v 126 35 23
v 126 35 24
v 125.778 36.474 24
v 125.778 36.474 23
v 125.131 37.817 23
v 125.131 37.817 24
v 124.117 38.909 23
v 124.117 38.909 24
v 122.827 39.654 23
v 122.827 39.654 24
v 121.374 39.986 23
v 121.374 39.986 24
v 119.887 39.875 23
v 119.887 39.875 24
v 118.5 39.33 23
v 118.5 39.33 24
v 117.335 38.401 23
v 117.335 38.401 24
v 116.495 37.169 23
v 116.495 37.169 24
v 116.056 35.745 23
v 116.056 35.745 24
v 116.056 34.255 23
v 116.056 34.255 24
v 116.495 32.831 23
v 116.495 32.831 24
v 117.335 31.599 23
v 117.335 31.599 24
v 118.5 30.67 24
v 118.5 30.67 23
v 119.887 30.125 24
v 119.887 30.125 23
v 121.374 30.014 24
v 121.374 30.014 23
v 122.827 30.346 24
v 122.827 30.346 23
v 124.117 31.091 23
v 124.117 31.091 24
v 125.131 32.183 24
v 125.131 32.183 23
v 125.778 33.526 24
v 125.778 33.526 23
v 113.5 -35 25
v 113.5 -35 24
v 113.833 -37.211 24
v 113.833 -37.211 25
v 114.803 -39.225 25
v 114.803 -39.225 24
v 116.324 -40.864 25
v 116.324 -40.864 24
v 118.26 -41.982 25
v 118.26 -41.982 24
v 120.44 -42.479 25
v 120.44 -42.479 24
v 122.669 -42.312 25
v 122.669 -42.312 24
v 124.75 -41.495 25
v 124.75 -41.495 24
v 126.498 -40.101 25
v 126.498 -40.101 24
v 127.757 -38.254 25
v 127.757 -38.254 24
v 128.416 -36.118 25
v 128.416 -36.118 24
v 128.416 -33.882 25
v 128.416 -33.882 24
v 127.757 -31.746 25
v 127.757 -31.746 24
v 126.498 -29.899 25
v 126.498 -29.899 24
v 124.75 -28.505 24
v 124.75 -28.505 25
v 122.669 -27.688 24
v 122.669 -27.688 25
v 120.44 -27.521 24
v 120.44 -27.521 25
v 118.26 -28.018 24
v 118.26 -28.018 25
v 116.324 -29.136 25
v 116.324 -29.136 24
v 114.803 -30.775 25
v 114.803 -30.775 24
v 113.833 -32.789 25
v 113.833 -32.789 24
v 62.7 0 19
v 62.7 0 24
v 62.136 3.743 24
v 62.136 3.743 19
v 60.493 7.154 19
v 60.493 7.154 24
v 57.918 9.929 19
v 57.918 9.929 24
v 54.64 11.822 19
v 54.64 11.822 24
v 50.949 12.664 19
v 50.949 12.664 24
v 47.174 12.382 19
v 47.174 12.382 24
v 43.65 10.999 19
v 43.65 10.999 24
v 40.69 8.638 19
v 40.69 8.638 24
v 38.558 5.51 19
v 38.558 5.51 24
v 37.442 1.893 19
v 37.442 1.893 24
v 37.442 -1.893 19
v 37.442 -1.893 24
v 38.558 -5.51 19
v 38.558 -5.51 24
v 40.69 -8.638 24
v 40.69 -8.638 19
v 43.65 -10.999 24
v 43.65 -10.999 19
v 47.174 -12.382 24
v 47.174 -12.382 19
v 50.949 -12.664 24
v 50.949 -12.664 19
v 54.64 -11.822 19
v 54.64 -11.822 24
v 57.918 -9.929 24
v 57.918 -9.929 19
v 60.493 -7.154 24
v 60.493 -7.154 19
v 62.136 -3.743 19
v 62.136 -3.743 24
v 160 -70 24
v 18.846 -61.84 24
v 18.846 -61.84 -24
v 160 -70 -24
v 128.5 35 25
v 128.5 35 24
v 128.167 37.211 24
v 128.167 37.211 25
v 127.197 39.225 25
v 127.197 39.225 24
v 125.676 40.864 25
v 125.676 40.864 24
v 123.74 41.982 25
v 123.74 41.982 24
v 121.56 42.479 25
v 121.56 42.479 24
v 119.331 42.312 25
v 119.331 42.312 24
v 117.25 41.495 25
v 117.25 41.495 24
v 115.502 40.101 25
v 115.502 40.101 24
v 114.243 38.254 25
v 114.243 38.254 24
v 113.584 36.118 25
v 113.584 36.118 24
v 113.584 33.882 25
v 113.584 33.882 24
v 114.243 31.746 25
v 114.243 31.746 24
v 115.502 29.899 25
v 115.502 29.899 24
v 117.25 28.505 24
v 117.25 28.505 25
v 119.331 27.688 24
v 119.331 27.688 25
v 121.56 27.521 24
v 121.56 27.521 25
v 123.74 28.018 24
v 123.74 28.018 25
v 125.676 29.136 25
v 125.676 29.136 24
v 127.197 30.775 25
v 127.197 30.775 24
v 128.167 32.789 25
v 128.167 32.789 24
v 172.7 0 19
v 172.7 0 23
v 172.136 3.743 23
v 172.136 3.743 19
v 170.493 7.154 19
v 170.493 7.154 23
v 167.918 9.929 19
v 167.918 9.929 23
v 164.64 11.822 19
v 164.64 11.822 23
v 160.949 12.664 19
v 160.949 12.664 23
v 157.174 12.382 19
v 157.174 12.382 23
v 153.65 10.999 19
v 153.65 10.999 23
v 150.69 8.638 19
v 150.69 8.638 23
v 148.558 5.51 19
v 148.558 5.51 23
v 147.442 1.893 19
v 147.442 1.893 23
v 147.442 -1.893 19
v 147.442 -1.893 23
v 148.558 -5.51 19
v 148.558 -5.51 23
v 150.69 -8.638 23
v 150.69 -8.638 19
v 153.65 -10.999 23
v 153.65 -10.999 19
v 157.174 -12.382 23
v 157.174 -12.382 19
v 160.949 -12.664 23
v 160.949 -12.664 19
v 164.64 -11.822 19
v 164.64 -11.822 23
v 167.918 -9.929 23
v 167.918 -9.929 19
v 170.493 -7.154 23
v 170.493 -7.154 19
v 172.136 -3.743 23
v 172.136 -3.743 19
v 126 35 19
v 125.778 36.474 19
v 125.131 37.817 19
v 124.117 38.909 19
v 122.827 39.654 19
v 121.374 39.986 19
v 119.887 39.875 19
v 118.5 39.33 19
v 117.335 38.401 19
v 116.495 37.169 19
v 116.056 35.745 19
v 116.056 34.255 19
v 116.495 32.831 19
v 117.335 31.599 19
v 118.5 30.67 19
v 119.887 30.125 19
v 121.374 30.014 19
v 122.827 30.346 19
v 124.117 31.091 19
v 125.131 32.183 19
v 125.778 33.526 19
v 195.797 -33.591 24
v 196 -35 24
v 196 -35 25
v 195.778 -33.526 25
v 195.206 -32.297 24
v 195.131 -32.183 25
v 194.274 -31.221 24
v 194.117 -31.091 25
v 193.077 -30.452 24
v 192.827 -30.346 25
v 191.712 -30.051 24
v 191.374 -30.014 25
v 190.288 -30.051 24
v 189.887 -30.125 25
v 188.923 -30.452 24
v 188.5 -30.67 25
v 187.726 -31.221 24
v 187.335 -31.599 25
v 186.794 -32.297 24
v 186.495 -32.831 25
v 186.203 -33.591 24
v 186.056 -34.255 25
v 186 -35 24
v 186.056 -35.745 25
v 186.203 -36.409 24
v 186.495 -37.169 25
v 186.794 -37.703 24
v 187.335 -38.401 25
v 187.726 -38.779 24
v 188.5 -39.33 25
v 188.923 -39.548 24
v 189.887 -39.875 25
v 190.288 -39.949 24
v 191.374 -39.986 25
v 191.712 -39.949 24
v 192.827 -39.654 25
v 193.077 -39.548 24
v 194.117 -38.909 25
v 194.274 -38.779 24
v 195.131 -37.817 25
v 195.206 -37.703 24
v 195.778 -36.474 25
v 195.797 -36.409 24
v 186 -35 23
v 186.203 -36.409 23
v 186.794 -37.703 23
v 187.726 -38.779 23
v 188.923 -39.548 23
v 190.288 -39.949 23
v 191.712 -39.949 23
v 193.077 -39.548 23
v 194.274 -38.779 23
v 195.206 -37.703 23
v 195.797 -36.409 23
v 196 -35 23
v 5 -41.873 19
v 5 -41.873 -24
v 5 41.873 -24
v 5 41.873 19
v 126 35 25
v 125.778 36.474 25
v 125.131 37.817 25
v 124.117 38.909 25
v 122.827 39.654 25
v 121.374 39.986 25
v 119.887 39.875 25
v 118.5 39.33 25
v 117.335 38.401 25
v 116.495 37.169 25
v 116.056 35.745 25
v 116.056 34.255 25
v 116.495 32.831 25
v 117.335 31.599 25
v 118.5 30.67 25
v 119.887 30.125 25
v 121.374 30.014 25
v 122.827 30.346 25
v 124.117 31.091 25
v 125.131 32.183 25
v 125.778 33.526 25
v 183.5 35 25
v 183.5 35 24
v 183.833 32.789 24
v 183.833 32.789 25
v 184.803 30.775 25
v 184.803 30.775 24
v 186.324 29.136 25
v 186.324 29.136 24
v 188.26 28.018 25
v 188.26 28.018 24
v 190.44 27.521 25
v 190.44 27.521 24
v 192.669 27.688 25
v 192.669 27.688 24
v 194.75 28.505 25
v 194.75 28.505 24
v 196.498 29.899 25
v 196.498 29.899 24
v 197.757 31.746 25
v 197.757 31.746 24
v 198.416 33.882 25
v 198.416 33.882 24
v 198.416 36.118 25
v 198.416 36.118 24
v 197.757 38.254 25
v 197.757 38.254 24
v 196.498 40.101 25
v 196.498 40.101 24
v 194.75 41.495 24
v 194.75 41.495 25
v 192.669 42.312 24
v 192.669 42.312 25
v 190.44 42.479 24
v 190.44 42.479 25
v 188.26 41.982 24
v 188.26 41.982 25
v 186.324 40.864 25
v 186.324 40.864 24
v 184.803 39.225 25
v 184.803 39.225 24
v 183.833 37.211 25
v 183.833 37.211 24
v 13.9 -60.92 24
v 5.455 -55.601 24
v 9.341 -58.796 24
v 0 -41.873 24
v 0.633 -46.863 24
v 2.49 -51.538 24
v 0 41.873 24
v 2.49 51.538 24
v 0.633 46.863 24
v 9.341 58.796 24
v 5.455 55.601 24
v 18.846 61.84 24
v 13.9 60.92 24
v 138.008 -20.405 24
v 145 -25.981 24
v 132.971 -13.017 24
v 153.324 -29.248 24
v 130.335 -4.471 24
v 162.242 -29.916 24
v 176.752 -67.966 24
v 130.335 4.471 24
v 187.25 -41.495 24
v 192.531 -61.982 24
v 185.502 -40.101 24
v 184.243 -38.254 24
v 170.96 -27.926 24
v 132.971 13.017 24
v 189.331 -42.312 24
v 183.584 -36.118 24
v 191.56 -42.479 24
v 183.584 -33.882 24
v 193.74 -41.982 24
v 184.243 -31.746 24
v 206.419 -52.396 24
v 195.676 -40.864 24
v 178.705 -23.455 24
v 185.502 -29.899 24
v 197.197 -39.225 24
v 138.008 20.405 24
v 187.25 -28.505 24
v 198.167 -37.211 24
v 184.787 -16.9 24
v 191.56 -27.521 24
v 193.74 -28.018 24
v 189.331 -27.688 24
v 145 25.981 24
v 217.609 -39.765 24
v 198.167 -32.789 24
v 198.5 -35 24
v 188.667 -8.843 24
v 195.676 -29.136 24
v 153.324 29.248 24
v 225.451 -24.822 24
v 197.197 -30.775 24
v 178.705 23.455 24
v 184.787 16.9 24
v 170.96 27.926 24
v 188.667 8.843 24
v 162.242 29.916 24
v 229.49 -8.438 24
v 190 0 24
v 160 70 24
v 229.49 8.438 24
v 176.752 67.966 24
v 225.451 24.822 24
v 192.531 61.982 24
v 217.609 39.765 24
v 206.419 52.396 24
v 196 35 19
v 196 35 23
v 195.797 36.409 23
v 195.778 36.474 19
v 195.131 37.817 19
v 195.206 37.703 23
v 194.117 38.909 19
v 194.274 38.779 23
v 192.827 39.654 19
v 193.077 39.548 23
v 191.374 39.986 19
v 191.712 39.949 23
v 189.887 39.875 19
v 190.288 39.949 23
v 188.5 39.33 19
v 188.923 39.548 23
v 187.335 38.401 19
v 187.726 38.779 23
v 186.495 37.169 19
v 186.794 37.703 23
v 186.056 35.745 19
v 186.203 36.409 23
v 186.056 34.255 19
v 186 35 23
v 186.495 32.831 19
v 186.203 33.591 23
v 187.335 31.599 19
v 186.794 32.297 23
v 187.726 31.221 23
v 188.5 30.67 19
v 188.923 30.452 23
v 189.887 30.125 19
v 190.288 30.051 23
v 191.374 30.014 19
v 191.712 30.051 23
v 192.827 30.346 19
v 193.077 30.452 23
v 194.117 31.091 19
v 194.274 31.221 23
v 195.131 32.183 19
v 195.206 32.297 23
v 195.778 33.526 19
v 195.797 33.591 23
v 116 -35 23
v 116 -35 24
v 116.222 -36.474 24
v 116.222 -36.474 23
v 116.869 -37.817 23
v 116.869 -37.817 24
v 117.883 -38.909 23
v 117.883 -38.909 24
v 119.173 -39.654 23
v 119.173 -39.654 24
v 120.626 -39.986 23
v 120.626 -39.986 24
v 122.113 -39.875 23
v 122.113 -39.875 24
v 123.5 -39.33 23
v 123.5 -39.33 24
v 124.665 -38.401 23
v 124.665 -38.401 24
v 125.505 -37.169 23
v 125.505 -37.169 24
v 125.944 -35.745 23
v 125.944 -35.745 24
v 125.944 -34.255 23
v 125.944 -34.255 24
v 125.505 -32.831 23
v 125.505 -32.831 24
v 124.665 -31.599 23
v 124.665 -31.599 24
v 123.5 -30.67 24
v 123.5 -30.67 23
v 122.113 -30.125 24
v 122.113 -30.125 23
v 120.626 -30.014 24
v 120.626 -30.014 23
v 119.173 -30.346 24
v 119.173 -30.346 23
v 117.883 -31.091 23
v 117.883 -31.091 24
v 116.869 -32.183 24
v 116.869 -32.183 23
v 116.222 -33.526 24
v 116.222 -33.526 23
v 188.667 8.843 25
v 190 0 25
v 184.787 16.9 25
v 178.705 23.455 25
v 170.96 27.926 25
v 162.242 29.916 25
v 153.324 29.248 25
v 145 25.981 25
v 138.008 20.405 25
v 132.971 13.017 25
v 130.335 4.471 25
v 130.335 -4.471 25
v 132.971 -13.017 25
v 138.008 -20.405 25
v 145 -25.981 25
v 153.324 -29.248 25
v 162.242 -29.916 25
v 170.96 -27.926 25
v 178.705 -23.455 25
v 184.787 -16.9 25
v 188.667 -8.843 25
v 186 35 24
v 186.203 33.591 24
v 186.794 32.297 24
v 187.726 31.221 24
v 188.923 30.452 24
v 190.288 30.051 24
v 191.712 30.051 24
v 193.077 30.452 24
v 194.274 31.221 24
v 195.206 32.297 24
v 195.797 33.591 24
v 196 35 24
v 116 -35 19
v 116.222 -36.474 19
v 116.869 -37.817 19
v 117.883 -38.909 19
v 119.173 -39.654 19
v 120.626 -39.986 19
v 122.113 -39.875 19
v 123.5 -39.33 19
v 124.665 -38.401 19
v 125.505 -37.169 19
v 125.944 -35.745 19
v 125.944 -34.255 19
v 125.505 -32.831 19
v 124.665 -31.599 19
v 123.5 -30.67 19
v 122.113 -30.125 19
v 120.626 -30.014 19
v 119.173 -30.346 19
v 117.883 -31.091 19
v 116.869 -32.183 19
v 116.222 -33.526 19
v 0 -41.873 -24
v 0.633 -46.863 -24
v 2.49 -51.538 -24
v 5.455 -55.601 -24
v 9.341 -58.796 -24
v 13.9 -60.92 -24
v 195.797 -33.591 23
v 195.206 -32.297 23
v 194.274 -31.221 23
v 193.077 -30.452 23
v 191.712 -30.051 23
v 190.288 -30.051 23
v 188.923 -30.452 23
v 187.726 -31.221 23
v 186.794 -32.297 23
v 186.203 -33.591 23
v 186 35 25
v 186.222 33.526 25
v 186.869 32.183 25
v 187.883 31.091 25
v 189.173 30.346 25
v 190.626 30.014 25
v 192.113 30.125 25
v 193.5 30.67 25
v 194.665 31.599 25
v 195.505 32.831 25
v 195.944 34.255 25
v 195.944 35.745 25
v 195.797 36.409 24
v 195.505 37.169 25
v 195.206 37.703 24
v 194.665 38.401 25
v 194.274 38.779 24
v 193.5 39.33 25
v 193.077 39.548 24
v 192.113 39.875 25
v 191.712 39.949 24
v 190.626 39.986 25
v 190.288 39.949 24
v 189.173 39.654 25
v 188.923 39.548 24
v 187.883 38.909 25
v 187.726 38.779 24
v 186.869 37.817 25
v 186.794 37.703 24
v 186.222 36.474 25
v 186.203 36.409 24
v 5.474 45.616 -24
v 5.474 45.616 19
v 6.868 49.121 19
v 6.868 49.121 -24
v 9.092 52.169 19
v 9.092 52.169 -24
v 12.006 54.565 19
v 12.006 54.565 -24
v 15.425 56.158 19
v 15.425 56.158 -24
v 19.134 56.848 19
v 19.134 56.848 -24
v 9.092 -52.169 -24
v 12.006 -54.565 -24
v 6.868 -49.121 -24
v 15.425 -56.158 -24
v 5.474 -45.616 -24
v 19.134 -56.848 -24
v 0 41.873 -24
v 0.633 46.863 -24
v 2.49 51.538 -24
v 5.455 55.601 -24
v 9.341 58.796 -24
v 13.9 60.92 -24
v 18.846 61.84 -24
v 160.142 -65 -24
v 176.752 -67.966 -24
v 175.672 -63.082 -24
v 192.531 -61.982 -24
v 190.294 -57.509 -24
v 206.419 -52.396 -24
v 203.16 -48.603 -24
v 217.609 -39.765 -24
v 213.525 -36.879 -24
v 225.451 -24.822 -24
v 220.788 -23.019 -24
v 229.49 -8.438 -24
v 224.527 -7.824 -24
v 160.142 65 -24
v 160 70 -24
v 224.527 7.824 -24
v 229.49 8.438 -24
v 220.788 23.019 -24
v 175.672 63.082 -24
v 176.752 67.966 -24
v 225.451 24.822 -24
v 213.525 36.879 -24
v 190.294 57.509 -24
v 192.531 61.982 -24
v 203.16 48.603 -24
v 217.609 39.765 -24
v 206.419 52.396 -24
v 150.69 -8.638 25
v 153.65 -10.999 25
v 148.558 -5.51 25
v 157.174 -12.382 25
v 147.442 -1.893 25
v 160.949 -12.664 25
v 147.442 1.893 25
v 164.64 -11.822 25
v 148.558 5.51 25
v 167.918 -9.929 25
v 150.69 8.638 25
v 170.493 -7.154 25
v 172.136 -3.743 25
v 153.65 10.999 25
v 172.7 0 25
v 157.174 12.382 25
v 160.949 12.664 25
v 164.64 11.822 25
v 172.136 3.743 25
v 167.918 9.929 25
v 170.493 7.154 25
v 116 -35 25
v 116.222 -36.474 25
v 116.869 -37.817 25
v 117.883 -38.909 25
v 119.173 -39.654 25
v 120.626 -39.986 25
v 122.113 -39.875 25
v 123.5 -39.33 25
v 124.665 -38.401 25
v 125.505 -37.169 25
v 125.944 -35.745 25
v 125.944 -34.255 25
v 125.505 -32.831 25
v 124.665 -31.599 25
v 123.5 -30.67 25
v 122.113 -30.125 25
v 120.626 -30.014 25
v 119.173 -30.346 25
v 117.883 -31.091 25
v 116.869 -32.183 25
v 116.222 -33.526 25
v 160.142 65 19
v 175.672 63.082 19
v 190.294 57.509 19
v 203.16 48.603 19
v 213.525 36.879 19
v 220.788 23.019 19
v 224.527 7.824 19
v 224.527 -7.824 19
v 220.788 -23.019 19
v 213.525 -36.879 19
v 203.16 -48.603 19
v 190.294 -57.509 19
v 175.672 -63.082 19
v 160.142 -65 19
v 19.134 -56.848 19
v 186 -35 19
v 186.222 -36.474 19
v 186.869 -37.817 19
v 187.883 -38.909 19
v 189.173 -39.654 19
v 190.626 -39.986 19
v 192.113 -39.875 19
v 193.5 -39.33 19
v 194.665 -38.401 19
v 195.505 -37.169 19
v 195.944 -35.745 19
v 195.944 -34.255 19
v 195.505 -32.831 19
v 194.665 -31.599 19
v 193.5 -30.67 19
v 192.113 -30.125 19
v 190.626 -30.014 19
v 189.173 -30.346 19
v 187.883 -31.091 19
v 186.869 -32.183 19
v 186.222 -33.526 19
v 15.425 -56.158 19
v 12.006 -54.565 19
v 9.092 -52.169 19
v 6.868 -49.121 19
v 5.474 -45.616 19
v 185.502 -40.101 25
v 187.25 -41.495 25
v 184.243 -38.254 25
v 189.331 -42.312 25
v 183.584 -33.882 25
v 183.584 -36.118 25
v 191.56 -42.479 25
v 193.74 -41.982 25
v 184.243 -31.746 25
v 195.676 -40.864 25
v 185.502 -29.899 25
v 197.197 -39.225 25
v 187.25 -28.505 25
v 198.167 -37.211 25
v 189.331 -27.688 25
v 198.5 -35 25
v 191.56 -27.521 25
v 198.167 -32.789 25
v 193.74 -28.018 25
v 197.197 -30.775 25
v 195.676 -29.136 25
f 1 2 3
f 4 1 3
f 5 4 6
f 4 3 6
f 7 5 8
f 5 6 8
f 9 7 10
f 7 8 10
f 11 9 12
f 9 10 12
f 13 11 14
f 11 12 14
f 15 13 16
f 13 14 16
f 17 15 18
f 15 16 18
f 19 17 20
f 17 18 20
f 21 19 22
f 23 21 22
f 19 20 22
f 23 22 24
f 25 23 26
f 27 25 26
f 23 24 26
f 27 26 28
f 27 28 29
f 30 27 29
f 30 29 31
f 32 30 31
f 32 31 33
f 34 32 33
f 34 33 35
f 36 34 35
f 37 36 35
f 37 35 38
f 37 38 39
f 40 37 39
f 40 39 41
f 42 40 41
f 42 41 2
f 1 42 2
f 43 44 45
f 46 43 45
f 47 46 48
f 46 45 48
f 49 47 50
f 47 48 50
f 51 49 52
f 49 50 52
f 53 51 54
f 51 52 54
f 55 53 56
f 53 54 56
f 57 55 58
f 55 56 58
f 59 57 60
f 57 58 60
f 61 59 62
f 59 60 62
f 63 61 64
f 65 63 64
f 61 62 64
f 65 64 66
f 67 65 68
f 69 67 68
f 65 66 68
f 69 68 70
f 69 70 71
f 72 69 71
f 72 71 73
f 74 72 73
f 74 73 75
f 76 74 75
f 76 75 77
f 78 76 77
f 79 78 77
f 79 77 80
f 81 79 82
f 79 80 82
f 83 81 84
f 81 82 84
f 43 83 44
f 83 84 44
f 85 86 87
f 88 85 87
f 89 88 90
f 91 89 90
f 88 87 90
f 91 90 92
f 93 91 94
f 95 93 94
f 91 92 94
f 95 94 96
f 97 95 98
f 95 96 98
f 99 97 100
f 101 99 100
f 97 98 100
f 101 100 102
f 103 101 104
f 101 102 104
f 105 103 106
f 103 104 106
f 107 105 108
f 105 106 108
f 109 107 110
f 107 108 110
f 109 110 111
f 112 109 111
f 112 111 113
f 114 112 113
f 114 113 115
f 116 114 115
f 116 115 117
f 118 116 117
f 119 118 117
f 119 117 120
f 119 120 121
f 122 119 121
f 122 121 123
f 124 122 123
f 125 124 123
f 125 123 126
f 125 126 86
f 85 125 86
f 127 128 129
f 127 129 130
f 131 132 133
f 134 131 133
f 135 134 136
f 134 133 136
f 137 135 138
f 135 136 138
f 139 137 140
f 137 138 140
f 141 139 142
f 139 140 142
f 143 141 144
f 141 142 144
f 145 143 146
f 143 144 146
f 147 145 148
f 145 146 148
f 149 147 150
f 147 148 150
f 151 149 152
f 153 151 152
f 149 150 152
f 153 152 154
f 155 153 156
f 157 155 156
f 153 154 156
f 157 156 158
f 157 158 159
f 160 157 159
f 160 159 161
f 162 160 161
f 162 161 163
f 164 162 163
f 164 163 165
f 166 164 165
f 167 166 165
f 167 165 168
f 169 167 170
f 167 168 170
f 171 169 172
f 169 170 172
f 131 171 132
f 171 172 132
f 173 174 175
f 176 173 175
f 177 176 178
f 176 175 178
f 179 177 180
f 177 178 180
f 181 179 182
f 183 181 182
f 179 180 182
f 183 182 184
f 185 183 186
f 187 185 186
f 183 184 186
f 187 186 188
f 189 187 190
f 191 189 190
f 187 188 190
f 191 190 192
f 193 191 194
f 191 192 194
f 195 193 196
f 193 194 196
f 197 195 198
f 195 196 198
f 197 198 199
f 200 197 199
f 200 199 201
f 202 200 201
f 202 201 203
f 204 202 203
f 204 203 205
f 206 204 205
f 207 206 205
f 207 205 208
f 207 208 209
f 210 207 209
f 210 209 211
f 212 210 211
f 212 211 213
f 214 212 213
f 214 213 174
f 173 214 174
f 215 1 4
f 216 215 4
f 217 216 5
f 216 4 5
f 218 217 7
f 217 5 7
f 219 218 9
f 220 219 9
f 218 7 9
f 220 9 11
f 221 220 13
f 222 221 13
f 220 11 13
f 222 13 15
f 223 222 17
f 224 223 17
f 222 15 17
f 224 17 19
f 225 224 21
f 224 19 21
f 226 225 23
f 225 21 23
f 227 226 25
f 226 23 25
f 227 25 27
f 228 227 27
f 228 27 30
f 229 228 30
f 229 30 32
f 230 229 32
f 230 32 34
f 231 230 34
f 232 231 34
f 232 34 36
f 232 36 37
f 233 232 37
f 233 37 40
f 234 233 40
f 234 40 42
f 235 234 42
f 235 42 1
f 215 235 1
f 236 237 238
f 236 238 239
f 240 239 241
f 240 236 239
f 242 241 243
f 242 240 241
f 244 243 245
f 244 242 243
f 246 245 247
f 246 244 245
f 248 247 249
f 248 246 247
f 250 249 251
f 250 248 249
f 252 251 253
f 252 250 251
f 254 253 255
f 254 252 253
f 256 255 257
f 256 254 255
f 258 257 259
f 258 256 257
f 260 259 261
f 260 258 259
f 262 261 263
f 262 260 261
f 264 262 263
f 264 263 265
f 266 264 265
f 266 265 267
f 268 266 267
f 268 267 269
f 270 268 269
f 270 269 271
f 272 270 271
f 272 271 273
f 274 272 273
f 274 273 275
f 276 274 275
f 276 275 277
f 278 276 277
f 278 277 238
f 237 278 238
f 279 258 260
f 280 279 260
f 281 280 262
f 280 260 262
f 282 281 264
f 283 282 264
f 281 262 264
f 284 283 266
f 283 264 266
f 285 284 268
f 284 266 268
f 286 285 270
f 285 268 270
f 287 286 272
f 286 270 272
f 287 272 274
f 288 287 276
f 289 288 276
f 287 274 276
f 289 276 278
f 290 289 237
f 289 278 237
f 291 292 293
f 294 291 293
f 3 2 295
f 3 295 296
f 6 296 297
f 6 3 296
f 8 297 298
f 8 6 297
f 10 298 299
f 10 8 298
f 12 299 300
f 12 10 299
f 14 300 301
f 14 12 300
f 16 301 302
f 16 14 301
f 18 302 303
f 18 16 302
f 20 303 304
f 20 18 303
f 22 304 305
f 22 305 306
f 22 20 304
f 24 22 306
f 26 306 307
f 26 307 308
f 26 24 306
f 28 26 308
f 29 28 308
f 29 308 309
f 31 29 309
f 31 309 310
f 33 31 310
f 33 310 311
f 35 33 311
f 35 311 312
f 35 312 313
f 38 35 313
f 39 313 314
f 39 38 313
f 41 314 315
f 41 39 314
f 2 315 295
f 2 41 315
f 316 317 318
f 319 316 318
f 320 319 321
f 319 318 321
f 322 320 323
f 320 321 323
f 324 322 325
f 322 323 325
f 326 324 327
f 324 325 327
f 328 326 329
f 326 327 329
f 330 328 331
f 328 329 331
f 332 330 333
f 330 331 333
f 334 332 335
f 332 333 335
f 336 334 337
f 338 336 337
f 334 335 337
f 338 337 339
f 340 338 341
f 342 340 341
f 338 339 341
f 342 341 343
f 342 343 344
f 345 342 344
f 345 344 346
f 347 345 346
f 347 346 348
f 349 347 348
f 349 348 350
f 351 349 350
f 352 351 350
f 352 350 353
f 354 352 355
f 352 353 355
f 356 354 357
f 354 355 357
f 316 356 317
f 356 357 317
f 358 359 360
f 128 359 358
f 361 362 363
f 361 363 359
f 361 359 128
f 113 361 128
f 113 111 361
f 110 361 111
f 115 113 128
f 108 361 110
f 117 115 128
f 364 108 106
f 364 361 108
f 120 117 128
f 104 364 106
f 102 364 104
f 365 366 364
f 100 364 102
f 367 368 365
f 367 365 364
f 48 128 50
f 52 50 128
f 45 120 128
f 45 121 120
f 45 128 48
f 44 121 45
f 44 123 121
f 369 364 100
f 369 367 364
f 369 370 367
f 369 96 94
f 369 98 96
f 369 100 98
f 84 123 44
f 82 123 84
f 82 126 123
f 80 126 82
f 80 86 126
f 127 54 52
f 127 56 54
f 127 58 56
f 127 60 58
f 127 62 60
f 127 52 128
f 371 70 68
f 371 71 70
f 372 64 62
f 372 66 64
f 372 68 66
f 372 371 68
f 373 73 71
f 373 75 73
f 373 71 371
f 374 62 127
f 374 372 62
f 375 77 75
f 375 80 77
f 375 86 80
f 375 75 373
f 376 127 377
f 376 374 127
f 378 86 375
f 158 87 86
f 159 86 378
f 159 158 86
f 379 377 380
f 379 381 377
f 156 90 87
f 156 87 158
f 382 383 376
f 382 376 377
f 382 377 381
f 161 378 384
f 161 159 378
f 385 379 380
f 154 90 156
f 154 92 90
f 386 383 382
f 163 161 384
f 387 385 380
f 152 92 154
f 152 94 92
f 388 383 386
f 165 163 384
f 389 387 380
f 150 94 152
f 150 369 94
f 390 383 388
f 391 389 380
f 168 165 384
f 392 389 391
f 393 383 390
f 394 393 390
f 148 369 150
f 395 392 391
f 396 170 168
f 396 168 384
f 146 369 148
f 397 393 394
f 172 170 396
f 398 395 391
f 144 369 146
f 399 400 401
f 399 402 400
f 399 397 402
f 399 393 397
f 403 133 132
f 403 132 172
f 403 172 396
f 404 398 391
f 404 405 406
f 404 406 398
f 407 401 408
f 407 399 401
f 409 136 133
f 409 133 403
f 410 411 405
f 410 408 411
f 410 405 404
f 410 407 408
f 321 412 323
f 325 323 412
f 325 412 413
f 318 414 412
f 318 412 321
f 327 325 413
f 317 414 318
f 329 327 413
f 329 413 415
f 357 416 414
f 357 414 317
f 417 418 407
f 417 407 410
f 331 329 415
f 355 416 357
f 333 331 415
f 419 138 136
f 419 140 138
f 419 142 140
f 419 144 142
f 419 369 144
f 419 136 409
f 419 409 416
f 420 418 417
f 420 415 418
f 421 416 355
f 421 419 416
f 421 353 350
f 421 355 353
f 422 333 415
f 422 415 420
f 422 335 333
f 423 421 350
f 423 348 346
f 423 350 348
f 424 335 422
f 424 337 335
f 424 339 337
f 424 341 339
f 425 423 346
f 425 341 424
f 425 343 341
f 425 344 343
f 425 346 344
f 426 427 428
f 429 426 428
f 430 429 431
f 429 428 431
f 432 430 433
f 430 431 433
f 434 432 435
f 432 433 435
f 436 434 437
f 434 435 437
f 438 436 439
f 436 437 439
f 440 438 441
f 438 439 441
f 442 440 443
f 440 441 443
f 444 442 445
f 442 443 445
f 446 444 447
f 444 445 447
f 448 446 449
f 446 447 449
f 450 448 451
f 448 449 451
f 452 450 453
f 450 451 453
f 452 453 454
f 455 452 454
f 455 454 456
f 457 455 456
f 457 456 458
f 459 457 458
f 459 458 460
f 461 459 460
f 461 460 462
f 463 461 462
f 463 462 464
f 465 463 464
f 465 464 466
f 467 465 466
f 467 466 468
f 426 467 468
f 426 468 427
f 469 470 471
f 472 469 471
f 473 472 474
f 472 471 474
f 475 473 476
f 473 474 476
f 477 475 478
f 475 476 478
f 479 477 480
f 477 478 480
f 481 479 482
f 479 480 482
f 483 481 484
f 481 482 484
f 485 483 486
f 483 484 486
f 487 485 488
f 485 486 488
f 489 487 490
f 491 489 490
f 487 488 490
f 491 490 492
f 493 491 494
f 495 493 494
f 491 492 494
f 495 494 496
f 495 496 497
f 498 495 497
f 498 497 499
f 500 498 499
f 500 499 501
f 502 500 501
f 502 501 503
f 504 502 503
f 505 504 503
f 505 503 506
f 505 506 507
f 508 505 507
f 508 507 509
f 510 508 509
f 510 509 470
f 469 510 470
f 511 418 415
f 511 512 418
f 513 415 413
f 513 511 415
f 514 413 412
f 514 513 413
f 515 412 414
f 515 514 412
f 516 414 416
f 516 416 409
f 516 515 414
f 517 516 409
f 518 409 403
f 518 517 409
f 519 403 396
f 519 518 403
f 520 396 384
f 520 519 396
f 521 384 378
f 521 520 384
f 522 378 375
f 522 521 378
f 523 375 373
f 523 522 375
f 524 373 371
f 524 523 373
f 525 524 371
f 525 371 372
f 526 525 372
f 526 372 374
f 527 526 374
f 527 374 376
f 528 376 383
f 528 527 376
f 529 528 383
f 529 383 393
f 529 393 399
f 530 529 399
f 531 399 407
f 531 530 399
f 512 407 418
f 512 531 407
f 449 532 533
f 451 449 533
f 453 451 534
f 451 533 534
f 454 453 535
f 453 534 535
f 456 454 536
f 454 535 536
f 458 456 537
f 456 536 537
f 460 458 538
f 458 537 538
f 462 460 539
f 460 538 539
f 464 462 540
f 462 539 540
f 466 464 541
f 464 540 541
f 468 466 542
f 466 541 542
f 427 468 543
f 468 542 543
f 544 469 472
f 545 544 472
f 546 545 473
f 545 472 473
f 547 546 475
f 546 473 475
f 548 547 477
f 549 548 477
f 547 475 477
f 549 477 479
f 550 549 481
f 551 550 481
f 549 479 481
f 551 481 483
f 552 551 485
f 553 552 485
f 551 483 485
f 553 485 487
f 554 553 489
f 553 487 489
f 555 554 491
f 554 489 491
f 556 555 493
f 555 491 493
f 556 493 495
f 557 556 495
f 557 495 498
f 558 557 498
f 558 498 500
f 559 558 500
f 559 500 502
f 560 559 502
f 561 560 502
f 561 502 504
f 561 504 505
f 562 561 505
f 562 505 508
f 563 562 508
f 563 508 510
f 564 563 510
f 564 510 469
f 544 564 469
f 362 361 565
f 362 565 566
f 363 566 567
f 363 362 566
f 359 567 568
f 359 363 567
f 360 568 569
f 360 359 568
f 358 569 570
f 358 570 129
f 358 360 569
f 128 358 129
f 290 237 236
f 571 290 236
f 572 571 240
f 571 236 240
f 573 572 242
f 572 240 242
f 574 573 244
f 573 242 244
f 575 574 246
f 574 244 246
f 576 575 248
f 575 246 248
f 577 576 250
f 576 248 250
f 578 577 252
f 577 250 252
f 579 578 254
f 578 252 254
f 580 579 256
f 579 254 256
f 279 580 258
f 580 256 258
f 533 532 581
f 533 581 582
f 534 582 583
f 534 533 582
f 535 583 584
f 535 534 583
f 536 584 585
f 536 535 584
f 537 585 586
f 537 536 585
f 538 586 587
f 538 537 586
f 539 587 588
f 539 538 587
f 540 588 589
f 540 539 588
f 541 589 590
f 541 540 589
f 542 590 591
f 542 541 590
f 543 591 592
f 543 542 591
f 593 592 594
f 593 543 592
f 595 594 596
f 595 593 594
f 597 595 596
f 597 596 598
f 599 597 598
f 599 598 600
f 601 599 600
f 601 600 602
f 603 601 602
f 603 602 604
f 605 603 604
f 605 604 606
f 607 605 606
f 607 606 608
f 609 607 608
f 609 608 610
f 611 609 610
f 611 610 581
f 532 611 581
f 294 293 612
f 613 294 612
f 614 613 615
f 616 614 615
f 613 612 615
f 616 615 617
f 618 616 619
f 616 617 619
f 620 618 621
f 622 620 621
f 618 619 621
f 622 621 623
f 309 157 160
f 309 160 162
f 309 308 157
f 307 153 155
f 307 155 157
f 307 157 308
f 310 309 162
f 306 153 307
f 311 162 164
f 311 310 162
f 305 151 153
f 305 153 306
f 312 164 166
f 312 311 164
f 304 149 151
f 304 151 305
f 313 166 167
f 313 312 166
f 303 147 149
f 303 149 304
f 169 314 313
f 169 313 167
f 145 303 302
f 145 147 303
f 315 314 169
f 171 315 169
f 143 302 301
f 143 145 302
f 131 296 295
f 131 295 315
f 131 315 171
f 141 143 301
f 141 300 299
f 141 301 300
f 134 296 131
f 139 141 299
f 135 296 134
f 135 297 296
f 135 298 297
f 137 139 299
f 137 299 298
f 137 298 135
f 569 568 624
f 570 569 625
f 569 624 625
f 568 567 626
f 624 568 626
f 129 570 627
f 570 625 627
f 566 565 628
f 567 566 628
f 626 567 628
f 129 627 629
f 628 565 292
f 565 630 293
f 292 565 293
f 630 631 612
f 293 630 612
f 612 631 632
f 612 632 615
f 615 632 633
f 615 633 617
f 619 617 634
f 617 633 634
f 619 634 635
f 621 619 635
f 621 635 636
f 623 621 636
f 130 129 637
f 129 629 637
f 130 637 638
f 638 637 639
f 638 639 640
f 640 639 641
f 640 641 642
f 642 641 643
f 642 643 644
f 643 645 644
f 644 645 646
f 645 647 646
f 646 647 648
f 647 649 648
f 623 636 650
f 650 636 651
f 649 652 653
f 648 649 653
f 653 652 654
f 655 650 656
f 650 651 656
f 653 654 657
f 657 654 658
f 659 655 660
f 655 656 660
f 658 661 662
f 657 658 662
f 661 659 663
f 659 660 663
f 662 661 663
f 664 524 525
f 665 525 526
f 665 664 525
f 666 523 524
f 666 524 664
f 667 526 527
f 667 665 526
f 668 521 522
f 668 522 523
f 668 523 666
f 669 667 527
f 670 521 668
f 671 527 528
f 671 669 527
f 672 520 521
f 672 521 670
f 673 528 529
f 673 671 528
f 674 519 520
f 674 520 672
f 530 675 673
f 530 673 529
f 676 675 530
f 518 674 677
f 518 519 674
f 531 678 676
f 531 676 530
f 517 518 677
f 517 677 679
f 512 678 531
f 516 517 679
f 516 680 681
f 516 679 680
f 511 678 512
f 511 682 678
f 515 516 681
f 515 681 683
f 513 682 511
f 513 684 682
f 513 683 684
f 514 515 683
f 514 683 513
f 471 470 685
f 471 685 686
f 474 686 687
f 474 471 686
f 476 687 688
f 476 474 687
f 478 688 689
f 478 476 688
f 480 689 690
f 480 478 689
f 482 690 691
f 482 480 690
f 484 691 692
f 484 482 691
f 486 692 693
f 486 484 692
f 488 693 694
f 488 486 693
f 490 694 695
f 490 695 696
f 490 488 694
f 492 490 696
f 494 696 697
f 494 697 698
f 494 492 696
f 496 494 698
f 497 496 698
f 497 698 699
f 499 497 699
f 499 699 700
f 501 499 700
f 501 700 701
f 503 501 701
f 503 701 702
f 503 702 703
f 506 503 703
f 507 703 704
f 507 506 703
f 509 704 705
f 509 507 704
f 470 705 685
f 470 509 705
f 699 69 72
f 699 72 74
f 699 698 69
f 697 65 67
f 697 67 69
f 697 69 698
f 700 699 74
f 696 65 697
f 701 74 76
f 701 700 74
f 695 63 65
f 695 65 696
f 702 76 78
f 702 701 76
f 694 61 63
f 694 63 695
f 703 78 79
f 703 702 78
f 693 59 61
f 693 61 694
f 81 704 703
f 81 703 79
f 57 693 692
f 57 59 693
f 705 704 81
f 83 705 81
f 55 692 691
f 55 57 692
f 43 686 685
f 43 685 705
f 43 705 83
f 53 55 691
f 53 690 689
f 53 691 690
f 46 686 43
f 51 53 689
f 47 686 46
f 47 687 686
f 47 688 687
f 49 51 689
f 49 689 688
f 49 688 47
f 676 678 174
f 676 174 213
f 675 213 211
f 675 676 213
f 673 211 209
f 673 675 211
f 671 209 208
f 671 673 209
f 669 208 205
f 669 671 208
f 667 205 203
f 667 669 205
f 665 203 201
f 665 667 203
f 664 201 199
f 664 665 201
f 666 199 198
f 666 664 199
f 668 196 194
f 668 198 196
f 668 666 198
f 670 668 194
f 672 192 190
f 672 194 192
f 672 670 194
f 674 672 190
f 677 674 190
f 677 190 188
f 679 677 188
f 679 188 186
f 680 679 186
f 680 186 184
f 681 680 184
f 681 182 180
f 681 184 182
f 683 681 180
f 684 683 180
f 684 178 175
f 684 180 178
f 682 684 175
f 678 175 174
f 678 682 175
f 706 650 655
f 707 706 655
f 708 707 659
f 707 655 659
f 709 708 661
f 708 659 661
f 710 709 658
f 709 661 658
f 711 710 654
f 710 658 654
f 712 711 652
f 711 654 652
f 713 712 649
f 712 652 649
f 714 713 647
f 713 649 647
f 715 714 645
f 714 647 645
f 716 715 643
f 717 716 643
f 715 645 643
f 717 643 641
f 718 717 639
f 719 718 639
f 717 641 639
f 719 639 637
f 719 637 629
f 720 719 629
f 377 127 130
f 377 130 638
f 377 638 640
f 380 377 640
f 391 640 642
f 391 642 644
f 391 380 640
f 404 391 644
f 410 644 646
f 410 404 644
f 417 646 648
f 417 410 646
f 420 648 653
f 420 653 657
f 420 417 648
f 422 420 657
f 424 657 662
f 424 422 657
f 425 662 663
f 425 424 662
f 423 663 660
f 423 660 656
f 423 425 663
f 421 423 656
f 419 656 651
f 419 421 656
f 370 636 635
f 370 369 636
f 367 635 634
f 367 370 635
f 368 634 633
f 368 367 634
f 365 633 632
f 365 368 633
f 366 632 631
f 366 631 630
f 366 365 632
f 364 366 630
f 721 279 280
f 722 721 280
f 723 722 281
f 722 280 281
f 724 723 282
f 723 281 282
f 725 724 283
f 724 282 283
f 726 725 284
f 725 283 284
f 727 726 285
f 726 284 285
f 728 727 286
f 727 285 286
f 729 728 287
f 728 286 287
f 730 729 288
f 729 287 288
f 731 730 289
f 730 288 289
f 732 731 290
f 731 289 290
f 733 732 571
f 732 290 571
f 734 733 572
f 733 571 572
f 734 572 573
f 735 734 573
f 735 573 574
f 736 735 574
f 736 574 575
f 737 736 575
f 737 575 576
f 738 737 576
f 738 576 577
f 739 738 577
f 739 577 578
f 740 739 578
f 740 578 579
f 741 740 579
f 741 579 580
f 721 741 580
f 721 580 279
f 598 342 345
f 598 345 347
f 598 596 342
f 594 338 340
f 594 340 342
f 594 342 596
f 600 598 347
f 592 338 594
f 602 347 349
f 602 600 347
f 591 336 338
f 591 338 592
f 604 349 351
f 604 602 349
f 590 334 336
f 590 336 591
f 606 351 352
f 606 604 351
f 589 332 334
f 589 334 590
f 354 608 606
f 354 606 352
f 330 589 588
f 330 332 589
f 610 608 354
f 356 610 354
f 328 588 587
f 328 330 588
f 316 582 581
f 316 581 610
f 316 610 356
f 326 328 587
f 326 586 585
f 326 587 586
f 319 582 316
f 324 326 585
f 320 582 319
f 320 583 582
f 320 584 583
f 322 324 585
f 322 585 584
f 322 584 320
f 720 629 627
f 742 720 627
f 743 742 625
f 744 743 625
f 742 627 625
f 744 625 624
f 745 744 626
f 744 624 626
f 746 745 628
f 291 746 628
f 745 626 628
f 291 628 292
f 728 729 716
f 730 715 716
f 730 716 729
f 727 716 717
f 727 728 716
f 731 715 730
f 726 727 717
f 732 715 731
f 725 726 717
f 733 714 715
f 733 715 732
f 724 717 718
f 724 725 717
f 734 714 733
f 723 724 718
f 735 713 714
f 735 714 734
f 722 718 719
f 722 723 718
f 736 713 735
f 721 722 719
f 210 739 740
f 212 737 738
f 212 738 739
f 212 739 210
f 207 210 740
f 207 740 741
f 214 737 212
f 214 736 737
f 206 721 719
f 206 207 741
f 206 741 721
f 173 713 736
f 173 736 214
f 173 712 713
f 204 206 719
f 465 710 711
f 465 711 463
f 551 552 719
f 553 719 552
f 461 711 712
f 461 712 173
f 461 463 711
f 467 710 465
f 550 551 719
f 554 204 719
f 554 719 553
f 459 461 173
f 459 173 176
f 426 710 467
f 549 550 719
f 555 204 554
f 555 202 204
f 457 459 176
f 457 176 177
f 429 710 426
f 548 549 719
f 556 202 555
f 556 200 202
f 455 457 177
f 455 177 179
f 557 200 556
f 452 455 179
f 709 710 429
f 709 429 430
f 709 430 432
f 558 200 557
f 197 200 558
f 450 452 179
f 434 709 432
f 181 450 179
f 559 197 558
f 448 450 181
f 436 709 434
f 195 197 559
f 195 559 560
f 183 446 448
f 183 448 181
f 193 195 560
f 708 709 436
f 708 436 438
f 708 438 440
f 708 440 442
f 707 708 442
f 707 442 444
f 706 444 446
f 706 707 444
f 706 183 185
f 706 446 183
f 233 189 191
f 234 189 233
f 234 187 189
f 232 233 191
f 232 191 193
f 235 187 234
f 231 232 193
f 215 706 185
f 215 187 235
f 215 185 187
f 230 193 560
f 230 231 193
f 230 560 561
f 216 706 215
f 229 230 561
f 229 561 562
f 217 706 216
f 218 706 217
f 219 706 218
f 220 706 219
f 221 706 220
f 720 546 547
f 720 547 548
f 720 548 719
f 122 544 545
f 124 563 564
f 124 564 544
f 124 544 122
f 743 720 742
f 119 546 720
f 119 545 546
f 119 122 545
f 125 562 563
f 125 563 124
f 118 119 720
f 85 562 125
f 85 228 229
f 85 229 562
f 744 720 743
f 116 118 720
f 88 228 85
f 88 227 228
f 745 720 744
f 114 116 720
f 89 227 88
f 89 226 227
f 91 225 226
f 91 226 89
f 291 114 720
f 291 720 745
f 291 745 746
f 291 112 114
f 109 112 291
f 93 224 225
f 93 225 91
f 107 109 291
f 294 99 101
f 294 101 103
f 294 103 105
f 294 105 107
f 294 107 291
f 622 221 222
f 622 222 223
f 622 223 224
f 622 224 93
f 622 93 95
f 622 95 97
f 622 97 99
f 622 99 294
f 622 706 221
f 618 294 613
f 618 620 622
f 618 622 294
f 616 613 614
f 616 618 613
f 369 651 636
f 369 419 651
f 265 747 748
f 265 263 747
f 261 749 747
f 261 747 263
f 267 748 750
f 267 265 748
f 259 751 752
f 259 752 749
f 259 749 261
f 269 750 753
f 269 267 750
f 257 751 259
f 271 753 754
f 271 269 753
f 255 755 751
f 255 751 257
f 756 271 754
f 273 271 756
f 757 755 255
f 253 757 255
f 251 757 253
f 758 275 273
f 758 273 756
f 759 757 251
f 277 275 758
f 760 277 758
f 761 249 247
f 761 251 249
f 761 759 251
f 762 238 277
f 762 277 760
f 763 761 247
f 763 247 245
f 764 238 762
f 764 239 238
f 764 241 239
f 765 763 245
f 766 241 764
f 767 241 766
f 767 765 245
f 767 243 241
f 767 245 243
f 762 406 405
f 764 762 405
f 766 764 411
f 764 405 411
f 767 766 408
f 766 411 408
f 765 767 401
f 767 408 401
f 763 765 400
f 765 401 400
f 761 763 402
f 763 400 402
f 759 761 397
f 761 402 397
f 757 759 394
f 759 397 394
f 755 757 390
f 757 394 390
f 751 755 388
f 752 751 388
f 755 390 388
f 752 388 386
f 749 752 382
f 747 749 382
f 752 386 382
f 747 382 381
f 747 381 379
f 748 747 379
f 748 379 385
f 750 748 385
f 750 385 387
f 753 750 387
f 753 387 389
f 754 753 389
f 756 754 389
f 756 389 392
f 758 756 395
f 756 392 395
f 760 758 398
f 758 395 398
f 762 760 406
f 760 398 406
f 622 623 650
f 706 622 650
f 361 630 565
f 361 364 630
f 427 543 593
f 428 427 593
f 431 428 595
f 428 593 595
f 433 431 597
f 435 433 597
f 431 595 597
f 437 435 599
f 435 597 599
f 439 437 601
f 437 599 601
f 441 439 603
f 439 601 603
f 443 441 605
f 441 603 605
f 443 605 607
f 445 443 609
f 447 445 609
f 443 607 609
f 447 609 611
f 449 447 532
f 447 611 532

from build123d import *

# Parameters (mm, degrees)
BOSS_EXTRUDE1_DEPTH = 24
CUT_EXTRUDE1_DEPTH  = 43
SKETCH4_R           = 12.7
CUT_EXTRUDE2_DEPTH  = 43
SKETCH5_R           = 5
CUT_EXTRUDE3_DEPTH  = 43
SKETCH6_R           = 7.5
SKETCH6_R_2         = 5
SKETCH6_R_3         = 30
SKETCH6_R_4         = 11
BOSS_EXTRUDE2_DEPTH = 1
SKETCH7_R           = 12.7
CUT_EXTRUDE4_DEPTH  = 10
CUT_EXTRUDE5_START  = -10
SKETCH8_R           = 12.7
CUT_EXTRUDE5_DEPTH  = 10


with BuildPart() as part:
    # Sketch1 → Boss-Extrude1 (new, symmetric)
    with BuildSketch(Plane.XY):
        with BuildLine():
            Line((0, 41.872855029), (0, -41.872855029))
            ThreePointArc((0, -41.872855029), (5.455474373, -55.600810969), (18.845677428, -61.839515726))
            Line((18.845677428, -61.839515726), (160, -70))
            ThreePointArc((160, -70), (230, 0), (160, 70))
            Line((160, 70), (18.845677428, 61.839515726))
            ThreePointArc((18.845677428, 61.839515726), (5.455474373, 55.600810969), (0, 41.872855029))
        make_face()
    extrude(amount=BOSS_EXTRUDE1_DEPTH, both=True)

    # Sketch2 → Cut-Extrude1 (cut)
    with BuildSketch(Plane(origin=(0, 0, -24), x_dir=(-1, 0, 0), z_dir=(0, 0, -1))):
        with BuildLine():
            Line((-19.134258071, 56.847850552), (-160.141737643, 64.999845465))
            ThreePointArc((-160.141737643, 64.999845465), (-225, 0), (-160.141737643, -64.999845465))
            Line((-160.141737643, -64.999845465), (-19.134258071, -56.847850552))
            ThreePointArc((-19.134258071, -56.847850552), (-9.09160578, -52.168821984), (-5, -41.872855029))
            Line((-5, -41.872855029), (-5, 41.872855029))
            ThreePointArc((-5, 41.872855029), (-9.09160578, 52.168821984), (-19.134258071, 56.847850552))
        make_face()
    extrude(amount=-CUT_EXTRUDE1_DEPTH, mode=Mode.SUBTRACT)

    # Sketch4 → Cut-Extrude2 (cut)
    with BuildSketch(Plane.XY.offset(24)):
        with Locations((160, 0)):
            Circle(SKETCH4_R)
    extrude(amount=-CUT_EXTRUDE2_DEPTH, mode=Mode.SUBTRACT)

    # Sketch5 → Cut-Extrude3 (cut)
    with BuildSketch(Plane.XY.offset(24)):
        with Locations((121, 35)):
            Circle(SKETCH5_R)
        with Locations((191, 35)):
            Circle(SKETCH5_R)
        with Locations(Location((191, -35, 0), (0, 0, 180))):
            Circle(SKETCH5_R)
        with Locations(Location((121, -35, 0), (0, 0, 180))):
            Circle(SKETCH5_R)
    extrude(amount=-CUT_EXTRUDE3_DEPTH, mode=Mode.SUBTRACT)

    # Sketch6 → Boss-Extrude2 (add, symmetric)
    # profile 1 of 5: a face of its own
    with BuildSketch(Plane.XY.offset(24)):
        with Locations((121, 35)):
            Circle(SKETCH6_R)
        with Locations((121, 35)):
            Circle(SKETCH6_R_2, mode=Mode.SUBTRACT)
    # profile 2 of 5: a face of its own
    with BuildSketch(Plane.XY.offset(24)):
        with Locations(Location((121, -35, 0), (0, 0, 180))):
            Circle(SKETCH6_R)
        with Locations(Location((121, -35, 0), (0, 0, 180))):
            Circle(SKETCH6_R_2, mode=Mode.SUBTRACT)
    # profile 3 of 5: a face of its own
    with BuildSketch(Plane.XY.offset(24)):
        with Locations(Location((191, 35, 0), (0, 0, 180))):
            Circle(SKETCH6_R)
        with Locations(Location((191, 35, 0), (0, 0, 180))):
            Circle(SKETCH6_R_2, mode=Mode.SUBTRACT)
    # profile 4 of 5: a face of its own
    with BuildSketch(Plane.XY.offset(24)):
        with Locations((191, -35)):
            Circle(SKETCH6_R)
        with Locations((191, -35)):
            Circle(SKETCH6_R_2, mode=Mode.SUBTRACT)
    # profile 5 of 5: a face of its own
    with BuildSketch(Plane.XY.offset(24)):
        with Locations((160, 0)):
            Circle(SKETCH6_R_3)
        with Locations((160, 0)):
            Circle(SKETCH6_R_4, mode=Mode.SUBTRACT)
    extrude(amount=BOSS_EXTRUDE2_DEPTH, both=True)

    # Sketch7 → Cut-Extrude4 (cut)
    with BuildSketch(Plane.XY.offset(24)):
        with Locations((50, 0)):
            Circle(SKETCH7_R)
    extrude(amount=-CUT_EXTRUDE4_DEPTH, mode=Mode.SUBTRACT)

    # Sketch8 → Cut-Extrude5 (cut)
    with BuildSketch(Plane(origin=(0, 0, 23), x_dir=(-1, 0, 0), z_dir=(0, 0, -1)).offset(CUT_EXTRUDE5_START)):
        with Locations(Location((-160, 0, 0), (0, 0, 180))):
            Circle(SKETCH8_R)
    extrude(amount=CUT_EXTRUDE5_DEPTH, mode=Mode.SUBTRACT)


solid = part.part
